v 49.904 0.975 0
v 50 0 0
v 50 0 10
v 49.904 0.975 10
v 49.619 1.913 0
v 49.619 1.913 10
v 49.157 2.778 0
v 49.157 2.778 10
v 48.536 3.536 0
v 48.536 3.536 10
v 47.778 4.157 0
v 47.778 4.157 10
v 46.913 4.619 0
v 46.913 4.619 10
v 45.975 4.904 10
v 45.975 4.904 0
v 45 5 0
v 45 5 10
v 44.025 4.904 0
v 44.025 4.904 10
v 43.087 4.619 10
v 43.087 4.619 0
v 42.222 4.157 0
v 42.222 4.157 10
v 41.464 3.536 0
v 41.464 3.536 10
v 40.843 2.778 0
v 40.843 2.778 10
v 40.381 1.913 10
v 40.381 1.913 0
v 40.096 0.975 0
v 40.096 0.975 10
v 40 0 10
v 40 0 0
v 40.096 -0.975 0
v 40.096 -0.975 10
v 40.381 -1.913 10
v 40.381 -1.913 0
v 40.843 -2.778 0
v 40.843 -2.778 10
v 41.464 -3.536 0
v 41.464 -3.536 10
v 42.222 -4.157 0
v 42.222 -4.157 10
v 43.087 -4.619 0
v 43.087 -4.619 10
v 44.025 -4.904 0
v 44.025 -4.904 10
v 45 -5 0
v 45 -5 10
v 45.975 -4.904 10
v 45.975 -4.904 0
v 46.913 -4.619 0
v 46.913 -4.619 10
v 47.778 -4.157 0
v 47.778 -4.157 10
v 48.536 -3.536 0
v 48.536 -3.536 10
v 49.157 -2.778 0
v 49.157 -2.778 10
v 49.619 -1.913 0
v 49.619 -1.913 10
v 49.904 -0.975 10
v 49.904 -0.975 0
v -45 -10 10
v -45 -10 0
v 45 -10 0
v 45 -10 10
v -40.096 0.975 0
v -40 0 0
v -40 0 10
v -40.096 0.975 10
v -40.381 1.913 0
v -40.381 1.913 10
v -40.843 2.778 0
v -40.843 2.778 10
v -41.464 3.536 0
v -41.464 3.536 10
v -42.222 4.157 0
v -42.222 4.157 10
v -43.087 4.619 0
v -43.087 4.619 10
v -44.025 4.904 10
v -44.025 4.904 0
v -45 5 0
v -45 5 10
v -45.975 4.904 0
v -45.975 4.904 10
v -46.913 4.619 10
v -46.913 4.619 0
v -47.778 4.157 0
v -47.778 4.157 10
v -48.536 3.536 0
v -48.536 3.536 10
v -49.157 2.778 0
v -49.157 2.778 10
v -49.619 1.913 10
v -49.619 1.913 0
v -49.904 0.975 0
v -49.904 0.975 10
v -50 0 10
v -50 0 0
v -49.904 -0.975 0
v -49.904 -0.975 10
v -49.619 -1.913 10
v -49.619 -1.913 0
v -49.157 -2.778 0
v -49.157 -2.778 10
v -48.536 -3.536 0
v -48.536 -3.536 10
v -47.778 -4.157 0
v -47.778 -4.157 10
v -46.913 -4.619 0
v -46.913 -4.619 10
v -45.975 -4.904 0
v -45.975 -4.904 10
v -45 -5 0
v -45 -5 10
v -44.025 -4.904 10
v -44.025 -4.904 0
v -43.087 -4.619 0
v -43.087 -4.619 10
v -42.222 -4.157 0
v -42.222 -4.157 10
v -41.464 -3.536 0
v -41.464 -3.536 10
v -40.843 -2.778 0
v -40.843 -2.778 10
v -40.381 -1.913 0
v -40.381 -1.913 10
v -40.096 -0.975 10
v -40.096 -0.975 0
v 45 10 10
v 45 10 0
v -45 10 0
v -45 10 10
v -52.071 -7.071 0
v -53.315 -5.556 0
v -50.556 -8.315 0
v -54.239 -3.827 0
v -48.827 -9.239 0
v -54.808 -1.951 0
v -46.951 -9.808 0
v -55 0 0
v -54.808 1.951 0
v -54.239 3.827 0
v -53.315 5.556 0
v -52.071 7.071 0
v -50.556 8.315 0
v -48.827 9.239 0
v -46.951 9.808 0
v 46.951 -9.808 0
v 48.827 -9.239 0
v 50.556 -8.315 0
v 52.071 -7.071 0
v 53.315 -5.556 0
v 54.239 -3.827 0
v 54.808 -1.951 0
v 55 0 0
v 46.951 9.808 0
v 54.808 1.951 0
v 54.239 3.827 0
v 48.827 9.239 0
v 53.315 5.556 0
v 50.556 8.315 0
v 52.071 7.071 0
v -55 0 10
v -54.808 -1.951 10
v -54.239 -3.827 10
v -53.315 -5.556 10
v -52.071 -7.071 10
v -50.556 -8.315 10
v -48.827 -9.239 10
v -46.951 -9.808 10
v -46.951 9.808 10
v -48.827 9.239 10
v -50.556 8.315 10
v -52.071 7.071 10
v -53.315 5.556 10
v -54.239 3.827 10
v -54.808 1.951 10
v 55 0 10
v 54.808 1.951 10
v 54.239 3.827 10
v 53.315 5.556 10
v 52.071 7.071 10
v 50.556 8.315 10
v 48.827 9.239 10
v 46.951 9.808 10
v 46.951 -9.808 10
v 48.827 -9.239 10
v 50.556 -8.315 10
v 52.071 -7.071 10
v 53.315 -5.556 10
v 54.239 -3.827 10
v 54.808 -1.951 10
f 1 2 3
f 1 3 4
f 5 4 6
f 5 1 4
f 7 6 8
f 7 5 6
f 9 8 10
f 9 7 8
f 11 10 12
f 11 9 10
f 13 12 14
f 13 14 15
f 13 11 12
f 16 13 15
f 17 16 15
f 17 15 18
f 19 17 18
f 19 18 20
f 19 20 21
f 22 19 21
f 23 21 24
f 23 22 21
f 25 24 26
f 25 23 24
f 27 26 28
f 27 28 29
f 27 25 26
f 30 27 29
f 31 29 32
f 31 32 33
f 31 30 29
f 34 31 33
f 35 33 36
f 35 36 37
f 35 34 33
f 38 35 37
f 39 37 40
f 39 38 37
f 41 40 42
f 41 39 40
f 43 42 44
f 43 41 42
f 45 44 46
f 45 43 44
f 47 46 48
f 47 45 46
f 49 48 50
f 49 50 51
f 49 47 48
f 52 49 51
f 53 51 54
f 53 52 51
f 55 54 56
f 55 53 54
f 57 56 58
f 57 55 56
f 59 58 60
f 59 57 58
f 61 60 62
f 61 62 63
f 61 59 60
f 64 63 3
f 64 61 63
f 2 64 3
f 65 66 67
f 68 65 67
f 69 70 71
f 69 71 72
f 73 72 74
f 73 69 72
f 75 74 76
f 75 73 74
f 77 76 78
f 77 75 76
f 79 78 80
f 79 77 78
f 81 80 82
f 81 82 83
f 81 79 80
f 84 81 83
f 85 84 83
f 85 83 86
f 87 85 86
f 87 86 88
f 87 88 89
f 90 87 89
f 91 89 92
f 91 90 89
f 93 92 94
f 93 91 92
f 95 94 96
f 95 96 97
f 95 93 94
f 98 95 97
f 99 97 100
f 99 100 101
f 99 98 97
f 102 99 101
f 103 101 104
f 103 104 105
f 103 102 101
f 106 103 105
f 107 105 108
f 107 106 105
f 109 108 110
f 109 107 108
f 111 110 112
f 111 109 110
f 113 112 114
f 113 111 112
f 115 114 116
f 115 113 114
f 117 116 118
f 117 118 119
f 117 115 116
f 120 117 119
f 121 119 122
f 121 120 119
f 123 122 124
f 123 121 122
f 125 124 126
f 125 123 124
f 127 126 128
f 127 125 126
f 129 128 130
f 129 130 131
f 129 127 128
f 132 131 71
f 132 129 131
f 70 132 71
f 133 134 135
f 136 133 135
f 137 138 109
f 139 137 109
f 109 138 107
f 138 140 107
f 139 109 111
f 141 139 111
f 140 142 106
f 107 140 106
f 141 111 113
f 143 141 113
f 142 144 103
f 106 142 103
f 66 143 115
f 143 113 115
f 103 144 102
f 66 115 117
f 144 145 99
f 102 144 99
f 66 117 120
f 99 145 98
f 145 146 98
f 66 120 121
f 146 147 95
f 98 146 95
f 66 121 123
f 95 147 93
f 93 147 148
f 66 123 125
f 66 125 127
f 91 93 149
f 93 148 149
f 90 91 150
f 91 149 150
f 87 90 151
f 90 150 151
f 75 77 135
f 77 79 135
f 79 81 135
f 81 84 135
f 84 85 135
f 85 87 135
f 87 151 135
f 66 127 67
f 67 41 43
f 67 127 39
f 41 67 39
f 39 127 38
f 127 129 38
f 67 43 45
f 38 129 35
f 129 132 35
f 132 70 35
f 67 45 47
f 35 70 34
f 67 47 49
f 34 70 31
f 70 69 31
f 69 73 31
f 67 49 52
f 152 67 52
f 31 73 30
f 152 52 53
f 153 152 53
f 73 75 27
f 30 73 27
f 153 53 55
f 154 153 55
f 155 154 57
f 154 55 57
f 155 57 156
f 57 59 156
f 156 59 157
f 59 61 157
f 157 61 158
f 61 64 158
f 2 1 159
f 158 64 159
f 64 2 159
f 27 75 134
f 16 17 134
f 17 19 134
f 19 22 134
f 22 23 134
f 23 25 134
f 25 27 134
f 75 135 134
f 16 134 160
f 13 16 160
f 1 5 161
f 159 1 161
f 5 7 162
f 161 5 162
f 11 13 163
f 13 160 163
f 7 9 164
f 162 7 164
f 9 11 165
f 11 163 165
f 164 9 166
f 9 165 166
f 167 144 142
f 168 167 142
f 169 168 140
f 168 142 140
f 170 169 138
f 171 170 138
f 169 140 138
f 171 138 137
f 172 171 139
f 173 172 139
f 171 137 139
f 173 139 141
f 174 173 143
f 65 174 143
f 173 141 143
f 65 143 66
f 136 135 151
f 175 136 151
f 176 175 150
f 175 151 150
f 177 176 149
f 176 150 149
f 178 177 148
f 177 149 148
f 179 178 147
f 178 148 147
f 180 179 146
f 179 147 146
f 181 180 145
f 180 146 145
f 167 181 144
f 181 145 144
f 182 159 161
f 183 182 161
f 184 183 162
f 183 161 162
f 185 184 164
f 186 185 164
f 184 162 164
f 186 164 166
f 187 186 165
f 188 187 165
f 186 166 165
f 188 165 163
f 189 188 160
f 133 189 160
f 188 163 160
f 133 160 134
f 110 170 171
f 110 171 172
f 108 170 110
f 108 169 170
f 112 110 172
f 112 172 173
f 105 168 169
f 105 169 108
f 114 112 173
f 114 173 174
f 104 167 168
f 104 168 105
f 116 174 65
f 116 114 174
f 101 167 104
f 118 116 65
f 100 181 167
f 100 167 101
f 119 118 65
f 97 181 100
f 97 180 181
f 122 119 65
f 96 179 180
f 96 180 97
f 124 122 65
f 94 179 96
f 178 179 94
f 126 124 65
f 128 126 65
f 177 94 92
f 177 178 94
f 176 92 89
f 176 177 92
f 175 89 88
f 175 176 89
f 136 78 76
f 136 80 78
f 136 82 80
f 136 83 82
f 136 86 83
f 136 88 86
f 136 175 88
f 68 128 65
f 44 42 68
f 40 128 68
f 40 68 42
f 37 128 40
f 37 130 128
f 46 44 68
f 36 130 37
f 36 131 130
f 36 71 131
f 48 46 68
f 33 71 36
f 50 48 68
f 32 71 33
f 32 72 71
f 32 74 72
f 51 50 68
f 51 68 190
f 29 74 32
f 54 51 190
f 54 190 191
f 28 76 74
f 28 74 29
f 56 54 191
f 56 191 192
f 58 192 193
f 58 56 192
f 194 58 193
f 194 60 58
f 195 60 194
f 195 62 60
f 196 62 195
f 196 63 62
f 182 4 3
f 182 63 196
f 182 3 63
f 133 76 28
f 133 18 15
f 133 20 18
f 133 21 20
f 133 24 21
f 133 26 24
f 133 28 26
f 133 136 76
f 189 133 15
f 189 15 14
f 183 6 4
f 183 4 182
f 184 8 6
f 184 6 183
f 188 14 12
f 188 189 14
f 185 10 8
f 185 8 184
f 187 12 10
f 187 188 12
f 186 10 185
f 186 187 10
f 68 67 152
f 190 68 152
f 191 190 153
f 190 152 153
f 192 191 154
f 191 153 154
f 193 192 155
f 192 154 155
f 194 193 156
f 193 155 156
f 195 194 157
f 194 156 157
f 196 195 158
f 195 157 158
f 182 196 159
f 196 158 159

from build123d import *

# Parameters (mm, degrees)
F0_R     = 5
F1_DEPTH = 10


with BuildPart() as f1:
    # F0 (on Top) → F1 (new body)
    with BuildSketch(Plane.XY):
        with BuildLine():
            ThreePointArc((55, 0), (52.071068, 7.071068), (45, 10))
            Line((45, 10), (-45, 10))
            ThreePointArc((-45, 10), (-52.071068, 7.071068), (-55, 0))
            ThreePointArc((-55, 0), (-52.071068, -7.071068), (-45, -10))
            Line((-45, -10), (45, -10))
            ThreePointArc((45, -10), (52.071068, -7.071068), (55, 0))
        make_face()
        with Locations((-45, 0)):
            Circle(F0_R, mode=Mode.SUBTRACT)
        with Locations((45, 0)):
            Circle(F0_R, mode=Mode.SUBTRACT)
    extrude(amount=F1_DEPTH)


solid = f1.part
